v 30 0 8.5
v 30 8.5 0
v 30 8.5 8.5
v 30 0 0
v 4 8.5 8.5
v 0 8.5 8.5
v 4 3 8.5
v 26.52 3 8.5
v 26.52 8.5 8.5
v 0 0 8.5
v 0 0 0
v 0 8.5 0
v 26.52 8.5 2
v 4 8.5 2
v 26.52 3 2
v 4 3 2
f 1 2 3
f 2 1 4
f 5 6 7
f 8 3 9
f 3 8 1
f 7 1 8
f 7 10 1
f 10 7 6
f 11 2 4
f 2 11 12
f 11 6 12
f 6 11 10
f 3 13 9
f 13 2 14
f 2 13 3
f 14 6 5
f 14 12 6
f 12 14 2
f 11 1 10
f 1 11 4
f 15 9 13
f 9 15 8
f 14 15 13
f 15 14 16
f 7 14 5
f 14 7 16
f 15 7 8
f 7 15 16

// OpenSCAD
dim = 22.62;
tol = 0.1;
difference(){
cube([30, 8.5, 8.5]);
translate([4, 3, 2])
cube([dim - tol, 20, 6.5]);
}
